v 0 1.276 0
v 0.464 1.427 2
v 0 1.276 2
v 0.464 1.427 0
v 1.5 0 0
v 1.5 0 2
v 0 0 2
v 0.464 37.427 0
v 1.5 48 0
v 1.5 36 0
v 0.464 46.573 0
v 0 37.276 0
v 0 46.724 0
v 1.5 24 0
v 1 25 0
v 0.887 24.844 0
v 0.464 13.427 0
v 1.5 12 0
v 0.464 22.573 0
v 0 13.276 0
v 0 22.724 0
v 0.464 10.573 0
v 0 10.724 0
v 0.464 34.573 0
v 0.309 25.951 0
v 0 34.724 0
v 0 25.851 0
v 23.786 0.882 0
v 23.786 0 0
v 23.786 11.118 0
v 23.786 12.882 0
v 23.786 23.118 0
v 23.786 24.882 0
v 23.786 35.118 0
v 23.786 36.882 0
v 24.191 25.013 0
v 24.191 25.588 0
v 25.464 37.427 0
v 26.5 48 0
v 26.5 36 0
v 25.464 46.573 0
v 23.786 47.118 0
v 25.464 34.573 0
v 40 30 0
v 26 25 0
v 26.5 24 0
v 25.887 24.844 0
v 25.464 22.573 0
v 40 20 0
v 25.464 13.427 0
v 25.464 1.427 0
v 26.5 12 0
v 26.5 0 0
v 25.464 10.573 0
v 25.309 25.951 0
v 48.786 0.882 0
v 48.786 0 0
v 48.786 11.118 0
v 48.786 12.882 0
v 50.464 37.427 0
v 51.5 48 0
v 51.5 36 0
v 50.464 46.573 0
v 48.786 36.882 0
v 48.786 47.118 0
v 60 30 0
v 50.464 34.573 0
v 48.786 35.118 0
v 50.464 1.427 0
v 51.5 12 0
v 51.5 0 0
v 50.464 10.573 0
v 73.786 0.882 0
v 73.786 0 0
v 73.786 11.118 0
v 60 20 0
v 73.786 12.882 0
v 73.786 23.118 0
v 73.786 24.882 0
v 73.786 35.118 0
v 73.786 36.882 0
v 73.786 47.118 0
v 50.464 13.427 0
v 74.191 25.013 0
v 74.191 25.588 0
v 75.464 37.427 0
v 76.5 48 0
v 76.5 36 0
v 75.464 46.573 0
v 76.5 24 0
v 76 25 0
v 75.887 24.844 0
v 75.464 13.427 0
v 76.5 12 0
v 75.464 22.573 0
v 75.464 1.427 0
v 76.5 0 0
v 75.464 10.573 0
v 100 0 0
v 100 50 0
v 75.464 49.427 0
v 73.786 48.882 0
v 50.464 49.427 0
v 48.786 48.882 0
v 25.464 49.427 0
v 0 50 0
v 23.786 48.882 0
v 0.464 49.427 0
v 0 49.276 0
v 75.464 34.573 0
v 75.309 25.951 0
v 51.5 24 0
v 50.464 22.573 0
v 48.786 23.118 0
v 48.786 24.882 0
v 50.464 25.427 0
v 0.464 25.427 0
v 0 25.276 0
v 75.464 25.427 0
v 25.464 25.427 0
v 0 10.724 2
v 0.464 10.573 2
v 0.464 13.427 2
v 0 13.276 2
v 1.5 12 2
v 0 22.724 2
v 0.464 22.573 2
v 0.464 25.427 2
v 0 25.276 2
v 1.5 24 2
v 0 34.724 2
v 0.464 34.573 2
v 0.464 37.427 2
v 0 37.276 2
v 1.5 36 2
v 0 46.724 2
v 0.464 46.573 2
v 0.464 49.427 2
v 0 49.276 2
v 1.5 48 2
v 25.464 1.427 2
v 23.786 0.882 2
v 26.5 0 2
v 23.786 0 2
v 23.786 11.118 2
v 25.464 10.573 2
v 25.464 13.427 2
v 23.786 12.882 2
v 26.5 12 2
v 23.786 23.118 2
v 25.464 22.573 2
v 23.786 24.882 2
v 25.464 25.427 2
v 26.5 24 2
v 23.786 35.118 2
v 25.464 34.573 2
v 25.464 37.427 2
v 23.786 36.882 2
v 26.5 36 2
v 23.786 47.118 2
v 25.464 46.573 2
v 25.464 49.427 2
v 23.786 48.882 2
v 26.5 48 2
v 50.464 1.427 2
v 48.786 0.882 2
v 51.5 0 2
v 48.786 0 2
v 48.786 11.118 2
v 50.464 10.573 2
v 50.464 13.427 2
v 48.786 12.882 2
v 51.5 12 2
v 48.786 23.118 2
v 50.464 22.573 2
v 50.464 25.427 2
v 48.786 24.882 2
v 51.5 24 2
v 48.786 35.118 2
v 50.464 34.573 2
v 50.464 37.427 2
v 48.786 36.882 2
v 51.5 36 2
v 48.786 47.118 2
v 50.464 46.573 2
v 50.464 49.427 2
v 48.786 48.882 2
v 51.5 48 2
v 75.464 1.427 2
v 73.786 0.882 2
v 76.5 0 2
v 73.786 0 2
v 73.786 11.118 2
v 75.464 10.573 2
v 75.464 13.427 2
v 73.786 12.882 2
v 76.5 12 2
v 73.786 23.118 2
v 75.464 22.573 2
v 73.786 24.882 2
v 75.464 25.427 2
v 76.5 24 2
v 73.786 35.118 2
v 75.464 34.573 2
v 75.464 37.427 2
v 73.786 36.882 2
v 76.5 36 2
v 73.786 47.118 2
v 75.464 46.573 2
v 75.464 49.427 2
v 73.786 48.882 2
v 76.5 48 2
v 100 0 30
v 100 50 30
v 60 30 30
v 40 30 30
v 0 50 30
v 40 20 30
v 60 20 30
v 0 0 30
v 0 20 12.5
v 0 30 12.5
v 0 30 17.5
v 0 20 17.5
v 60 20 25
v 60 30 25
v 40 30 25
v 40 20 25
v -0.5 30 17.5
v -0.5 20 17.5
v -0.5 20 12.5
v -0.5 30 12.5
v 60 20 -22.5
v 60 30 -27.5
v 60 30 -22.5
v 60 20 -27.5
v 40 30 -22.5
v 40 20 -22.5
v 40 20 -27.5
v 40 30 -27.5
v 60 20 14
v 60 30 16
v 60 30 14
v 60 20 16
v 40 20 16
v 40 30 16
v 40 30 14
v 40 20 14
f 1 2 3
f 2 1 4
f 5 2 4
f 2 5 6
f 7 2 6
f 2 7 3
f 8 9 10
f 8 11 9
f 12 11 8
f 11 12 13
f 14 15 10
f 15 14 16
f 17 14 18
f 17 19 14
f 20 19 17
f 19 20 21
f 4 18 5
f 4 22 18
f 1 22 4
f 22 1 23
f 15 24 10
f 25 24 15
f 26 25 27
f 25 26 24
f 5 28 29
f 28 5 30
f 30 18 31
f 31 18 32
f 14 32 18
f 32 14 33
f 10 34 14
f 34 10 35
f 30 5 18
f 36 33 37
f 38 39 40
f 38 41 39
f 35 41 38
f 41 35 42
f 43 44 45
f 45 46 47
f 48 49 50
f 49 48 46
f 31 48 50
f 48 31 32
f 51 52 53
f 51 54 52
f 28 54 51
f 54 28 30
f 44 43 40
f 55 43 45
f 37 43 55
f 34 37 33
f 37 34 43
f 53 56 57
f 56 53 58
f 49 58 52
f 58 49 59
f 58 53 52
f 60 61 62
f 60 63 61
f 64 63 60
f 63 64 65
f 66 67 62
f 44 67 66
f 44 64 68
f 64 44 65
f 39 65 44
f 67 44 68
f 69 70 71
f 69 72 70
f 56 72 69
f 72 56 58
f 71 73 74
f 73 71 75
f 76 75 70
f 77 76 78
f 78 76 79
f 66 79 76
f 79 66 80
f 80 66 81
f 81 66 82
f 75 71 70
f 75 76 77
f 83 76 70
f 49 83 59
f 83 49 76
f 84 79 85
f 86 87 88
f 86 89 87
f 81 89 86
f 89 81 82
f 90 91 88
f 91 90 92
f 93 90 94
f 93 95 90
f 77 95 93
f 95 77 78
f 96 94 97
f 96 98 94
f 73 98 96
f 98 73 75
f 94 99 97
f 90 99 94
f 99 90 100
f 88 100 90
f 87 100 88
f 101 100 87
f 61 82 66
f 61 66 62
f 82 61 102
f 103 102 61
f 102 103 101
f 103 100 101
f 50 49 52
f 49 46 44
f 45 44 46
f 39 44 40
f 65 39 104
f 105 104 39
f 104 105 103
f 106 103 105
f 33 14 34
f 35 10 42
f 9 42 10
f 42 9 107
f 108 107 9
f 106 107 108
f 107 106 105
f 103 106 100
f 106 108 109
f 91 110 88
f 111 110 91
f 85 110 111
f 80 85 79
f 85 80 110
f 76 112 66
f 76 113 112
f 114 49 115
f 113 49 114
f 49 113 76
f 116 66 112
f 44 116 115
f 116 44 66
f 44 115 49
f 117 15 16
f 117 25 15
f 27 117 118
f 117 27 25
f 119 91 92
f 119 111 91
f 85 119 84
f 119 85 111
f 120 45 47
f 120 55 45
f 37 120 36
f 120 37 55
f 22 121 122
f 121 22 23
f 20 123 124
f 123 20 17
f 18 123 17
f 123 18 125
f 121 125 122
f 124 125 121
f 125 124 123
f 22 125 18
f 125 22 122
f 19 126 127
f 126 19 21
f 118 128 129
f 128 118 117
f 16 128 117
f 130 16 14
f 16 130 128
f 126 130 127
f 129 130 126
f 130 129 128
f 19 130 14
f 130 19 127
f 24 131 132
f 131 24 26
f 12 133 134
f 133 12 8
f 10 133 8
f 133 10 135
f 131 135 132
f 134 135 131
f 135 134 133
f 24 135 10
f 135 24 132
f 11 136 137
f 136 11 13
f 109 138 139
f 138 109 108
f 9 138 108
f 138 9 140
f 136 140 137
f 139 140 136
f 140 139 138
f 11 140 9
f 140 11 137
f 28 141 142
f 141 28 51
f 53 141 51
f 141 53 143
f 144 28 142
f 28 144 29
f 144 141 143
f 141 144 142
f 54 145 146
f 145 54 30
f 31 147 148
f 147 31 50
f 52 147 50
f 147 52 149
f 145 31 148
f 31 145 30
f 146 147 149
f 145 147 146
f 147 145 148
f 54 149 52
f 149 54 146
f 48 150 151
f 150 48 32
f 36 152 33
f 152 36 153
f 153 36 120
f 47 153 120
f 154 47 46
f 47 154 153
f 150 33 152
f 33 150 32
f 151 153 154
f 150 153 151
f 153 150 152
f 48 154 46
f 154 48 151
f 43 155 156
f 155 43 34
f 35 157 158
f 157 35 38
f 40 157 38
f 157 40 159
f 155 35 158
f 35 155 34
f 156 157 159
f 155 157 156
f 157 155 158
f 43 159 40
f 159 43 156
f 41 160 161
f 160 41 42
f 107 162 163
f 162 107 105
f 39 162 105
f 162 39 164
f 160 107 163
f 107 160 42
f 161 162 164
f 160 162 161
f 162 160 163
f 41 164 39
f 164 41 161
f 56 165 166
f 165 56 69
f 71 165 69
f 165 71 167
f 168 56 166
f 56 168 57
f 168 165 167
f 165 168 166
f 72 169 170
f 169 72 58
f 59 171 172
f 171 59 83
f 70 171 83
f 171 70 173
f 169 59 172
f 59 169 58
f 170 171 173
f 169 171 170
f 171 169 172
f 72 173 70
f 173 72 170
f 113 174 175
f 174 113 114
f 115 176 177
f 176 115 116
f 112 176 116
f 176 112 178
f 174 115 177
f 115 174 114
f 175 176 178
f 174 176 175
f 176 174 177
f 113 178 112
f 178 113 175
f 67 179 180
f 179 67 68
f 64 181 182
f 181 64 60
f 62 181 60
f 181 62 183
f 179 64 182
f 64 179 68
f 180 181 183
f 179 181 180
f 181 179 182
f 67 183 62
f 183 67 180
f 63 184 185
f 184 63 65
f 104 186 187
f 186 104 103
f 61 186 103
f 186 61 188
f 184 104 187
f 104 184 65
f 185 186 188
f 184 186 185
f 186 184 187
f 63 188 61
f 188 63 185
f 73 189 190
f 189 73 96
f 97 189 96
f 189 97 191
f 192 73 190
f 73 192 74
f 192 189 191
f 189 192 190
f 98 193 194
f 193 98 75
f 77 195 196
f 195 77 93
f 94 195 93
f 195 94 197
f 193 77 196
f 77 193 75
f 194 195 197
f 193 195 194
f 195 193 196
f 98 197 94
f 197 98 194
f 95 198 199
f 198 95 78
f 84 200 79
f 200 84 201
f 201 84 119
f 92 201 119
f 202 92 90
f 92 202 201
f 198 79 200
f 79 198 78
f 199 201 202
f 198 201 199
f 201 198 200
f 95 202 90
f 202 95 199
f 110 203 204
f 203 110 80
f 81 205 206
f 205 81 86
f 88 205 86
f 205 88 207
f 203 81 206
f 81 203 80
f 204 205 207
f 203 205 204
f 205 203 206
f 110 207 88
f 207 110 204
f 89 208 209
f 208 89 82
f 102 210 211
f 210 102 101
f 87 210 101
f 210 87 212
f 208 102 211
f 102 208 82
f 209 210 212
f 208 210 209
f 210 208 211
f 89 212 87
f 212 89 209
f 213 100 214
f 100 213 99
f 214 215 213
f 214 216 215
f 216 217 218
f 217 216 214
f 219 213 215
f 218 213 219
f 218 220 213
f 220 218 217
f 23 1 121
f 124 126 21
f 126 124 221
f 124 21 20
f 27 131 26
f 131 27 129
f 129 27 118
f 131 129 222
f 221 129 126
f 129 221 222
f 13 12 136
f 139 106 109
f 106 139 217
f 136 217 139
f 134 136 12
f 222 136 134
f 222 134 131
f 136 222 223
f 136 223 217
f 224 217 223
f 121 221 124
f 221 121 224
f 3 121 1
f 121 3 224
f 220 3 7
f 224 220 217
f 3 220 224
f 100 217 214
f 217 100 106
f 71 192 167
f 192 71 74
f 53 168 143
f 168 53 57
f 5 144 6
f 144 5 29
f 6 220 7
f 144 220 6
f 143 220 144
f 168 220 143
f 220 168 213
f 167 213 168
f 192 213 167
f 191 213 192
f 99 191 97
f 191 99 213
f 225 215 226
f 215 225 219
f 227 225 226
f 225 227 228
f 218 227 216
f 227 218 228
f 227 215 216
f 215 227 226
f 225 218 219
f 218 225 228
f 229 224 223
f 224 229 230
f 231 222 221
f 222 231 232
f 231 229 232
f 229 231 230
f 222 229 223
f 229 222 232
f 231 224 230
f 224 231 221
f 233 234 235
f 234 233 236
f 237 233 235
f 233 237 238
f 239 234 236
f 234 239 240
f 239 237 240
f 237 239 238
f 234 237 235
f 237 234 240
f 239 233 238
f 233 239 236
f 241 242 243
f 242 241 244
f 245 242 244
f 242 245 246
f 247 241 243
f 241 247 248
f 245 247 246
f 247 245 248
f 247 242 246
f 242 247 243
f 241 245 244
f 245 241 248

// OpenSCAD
difference() {
	union() {
		difference() {
			difference() {
				cube(center = false, size = [100, 50, 30]);
				translate(v = [40.0000000000, 20.0000000000, 25]) {
					cube(center = false, size = [20, 10, 5]);
				}
				translate(v = [40.0000000000, 20.0000000000, -2]) {
					cube(center = false, size = [20, 10, 2]);
				}
				union() {
					translate(v = [0, 0, 0]) {
						cylinder(center = false, h = 2, r = 1.5000000000);
					}
					translate(v = [0, 12, 0]) {
						cylinder(center = false, h = 2, r = 1.5000000000);
					}
					translate(v = [0, 24, 0]) {
						cylinder(center = false, h = 2, r = 1.5000000000);
					}
					translate(v = [0, 36, 0]) {
						cylinder(center = false, h = 2, r = 1.5000000000);
					}
					translate(v = [0, 48, 0]) {
						cylinder(center = false, h = 2, r = 1.5000000000);
					}
					translate(v = [25, 0, 0]) {
						cylinder(center = false, h = 2, r = 1.5000000000);
					}
					translate(v = [25, 12, 0]) {
						cylinder(center = false, h = 2, r = 1.5000000000);
					}
					translate(v = [25, 24, 0]) {
						cylinder(center = false, h = 2, r = 1.5000000000);
					}
					translate(v = [25, 36, 0]) {
						cylinder(center = false, h = 2, r = 1.5000000000);
					}
					translate(v = [25, 48, 0]) {
						cylinder(center = false, h = 2, r = 1.5000000000);
					}
					translate(v = [50, 0, 0]) {
						cylinder(center = false, h = 2, r = 1.5000000000);
					}
					translate(v = [50, 12, 0]) {
						cylinder(center = false, h = 2, r = 1.5000000000);
					}
					translate(v = [50, 24, 0]) {
						cylinder(center = false, h = 2, r = 1.5000000000);
					}
					translate(v = [50, 36, 0]) {
						cylinder(center = false, h = 2, r = 1.5000000000);
					}
					translate(v = [50, 48, 0]) {
						cylinder(center = false, h = 2, r = 1.5000000000);
					}
					translate(v = [75, 0, 0]) {
						cylinder(center = false, h = 2, r = 1.5000000000);
					}
					translate(v = [75, 12, 0]) {
						cylinder(center = false, h = 2, r = 1.5000000000);
					}
					translate(v = [75, 24, 0]) {
						cylinder(center = false, h = 2, r = 1.5000000000);
					}
					translate(v = [75, 36, 0]) {
						cylinder(center = false, h = 2, r = 1.5000000000);
					}
					translate(v = [75, 48, 0]) {
						cylinder(center = false, h = 2, r = 1.5000000000);
					}
				}
				union() {
					translate(v = [0, 25.0000000000, -30]) {
						cylinder(center = false, h = 30, r = 1);
					}
					translate(v = [25, 25.0000000000, -30]) {
						cylinder(center = false, h = 30, r = 1);
					}
					translate(v = [50, 25.0000000000, -30]) {
						cylinder(center = false, h = 30, r = 1);
					}
					translate(v = [75, 25.0000000000, -30]) {
						cylinder(center = false, h = 30, r = 1);
					}
				}
			}
		}
		translate(v = [50.0000000000, 25.0000000000, -25]) {
			cube(center = true, size = [20, 10, 5]);
		}
		union() {
			translate(v = [0, 25.0000000000, 15.0000000000]) {
				cube(center = true, size = [1, 10, 5]);
			}
			translate(v = [5, 25.0000000000, 15.0000000000]) {
				cube(center = true, size = [1, 10, 5]);
			}
			translate(v = [10, 25.0000000000, 15.0000000000]) {
				cube(center = true, size = [1, 10, 5]);
			}
			translate(v = [15, 25.0000000000, 15.0000000000]) {
				cube(center = true, size = [1, 10, 5]);
			}
			translate(v = [20, 25.0000000000, 15.0000000000]) {
				cube(center = true, size = [1, 10, 5]);
			}
			translate(v = [25, 25.0000000000, 15.0000000000]) {
				cube(center = true, size = [1, 10, 5]);
			}
			translate(v = [30, 25.0000000000, 15.0000000000]) {
				cube(center = true, size = [1, 10, 5]);
			}
			translate(v = [35, 25.0000000000, 15.0000000000]) {
				cube(center = true, size = [1, 10, 5]);
			}
			translate(v = [40, 25.0000000000, 15.0000000000]) {
				cube(center = true, size = [1, 10, 5]);
			}
			translate(v = [45, 25.0000000000, 15.0000000000]) {
				cube(center = true, size = [1, 10, 5]);
			}
			translate(v = [50, 25.0000000000, 15.0000000000]) {
				cube(center = true, size = [1, 10, 5]);
			}
			translate(v = [55, 25.0000000000, 15.0000000000]) {
				cube(center = true, size = [1, 10, 5]);
			}
			translate(v = [60, 25.0000000000, 15.0000000000]) {
				cube(center = true, size = [1, 10, 5]);
			}
			translate(v = [65, 25.0000000000, 15.0000000000]) {
				cube(center = true, size = [1, 10, 5]);
			}
			translate(v = [70, 25.0000000000, 15.0000000000]) {
				cube(center = true, size = [1, 10, 5]);
			}
			translate(v = [75, 25.0000000000, 15.0000000000]) {
				cube(center = true, size = [1, 10, 5]);
			}
			translate(v = [80, 25.0000000000, 15.0000000000]) {
				cube(center = true, size = [1, 10, 5]);
			}
			translate(v = [85, 25.0000000000, 15.0000000000]) {
				cube(center = true, size = [1, 10, 5]);
			}
			translate(v = [90, 25.0000000000, 15.0000000000]) {
				cube(center = true, size = [1, 10, 5]);
			}
			translate(v = [95, 25.0000000000, 15.0000000000]) {
				cube(center = true, size = [1, 10, 5]);
			}
		}
	}
	translate(v = [50.0000000000, 25.0000000000, 15.0000000000]) {
		cube(center = true, size = [20, 10, 2]);
	}
}
